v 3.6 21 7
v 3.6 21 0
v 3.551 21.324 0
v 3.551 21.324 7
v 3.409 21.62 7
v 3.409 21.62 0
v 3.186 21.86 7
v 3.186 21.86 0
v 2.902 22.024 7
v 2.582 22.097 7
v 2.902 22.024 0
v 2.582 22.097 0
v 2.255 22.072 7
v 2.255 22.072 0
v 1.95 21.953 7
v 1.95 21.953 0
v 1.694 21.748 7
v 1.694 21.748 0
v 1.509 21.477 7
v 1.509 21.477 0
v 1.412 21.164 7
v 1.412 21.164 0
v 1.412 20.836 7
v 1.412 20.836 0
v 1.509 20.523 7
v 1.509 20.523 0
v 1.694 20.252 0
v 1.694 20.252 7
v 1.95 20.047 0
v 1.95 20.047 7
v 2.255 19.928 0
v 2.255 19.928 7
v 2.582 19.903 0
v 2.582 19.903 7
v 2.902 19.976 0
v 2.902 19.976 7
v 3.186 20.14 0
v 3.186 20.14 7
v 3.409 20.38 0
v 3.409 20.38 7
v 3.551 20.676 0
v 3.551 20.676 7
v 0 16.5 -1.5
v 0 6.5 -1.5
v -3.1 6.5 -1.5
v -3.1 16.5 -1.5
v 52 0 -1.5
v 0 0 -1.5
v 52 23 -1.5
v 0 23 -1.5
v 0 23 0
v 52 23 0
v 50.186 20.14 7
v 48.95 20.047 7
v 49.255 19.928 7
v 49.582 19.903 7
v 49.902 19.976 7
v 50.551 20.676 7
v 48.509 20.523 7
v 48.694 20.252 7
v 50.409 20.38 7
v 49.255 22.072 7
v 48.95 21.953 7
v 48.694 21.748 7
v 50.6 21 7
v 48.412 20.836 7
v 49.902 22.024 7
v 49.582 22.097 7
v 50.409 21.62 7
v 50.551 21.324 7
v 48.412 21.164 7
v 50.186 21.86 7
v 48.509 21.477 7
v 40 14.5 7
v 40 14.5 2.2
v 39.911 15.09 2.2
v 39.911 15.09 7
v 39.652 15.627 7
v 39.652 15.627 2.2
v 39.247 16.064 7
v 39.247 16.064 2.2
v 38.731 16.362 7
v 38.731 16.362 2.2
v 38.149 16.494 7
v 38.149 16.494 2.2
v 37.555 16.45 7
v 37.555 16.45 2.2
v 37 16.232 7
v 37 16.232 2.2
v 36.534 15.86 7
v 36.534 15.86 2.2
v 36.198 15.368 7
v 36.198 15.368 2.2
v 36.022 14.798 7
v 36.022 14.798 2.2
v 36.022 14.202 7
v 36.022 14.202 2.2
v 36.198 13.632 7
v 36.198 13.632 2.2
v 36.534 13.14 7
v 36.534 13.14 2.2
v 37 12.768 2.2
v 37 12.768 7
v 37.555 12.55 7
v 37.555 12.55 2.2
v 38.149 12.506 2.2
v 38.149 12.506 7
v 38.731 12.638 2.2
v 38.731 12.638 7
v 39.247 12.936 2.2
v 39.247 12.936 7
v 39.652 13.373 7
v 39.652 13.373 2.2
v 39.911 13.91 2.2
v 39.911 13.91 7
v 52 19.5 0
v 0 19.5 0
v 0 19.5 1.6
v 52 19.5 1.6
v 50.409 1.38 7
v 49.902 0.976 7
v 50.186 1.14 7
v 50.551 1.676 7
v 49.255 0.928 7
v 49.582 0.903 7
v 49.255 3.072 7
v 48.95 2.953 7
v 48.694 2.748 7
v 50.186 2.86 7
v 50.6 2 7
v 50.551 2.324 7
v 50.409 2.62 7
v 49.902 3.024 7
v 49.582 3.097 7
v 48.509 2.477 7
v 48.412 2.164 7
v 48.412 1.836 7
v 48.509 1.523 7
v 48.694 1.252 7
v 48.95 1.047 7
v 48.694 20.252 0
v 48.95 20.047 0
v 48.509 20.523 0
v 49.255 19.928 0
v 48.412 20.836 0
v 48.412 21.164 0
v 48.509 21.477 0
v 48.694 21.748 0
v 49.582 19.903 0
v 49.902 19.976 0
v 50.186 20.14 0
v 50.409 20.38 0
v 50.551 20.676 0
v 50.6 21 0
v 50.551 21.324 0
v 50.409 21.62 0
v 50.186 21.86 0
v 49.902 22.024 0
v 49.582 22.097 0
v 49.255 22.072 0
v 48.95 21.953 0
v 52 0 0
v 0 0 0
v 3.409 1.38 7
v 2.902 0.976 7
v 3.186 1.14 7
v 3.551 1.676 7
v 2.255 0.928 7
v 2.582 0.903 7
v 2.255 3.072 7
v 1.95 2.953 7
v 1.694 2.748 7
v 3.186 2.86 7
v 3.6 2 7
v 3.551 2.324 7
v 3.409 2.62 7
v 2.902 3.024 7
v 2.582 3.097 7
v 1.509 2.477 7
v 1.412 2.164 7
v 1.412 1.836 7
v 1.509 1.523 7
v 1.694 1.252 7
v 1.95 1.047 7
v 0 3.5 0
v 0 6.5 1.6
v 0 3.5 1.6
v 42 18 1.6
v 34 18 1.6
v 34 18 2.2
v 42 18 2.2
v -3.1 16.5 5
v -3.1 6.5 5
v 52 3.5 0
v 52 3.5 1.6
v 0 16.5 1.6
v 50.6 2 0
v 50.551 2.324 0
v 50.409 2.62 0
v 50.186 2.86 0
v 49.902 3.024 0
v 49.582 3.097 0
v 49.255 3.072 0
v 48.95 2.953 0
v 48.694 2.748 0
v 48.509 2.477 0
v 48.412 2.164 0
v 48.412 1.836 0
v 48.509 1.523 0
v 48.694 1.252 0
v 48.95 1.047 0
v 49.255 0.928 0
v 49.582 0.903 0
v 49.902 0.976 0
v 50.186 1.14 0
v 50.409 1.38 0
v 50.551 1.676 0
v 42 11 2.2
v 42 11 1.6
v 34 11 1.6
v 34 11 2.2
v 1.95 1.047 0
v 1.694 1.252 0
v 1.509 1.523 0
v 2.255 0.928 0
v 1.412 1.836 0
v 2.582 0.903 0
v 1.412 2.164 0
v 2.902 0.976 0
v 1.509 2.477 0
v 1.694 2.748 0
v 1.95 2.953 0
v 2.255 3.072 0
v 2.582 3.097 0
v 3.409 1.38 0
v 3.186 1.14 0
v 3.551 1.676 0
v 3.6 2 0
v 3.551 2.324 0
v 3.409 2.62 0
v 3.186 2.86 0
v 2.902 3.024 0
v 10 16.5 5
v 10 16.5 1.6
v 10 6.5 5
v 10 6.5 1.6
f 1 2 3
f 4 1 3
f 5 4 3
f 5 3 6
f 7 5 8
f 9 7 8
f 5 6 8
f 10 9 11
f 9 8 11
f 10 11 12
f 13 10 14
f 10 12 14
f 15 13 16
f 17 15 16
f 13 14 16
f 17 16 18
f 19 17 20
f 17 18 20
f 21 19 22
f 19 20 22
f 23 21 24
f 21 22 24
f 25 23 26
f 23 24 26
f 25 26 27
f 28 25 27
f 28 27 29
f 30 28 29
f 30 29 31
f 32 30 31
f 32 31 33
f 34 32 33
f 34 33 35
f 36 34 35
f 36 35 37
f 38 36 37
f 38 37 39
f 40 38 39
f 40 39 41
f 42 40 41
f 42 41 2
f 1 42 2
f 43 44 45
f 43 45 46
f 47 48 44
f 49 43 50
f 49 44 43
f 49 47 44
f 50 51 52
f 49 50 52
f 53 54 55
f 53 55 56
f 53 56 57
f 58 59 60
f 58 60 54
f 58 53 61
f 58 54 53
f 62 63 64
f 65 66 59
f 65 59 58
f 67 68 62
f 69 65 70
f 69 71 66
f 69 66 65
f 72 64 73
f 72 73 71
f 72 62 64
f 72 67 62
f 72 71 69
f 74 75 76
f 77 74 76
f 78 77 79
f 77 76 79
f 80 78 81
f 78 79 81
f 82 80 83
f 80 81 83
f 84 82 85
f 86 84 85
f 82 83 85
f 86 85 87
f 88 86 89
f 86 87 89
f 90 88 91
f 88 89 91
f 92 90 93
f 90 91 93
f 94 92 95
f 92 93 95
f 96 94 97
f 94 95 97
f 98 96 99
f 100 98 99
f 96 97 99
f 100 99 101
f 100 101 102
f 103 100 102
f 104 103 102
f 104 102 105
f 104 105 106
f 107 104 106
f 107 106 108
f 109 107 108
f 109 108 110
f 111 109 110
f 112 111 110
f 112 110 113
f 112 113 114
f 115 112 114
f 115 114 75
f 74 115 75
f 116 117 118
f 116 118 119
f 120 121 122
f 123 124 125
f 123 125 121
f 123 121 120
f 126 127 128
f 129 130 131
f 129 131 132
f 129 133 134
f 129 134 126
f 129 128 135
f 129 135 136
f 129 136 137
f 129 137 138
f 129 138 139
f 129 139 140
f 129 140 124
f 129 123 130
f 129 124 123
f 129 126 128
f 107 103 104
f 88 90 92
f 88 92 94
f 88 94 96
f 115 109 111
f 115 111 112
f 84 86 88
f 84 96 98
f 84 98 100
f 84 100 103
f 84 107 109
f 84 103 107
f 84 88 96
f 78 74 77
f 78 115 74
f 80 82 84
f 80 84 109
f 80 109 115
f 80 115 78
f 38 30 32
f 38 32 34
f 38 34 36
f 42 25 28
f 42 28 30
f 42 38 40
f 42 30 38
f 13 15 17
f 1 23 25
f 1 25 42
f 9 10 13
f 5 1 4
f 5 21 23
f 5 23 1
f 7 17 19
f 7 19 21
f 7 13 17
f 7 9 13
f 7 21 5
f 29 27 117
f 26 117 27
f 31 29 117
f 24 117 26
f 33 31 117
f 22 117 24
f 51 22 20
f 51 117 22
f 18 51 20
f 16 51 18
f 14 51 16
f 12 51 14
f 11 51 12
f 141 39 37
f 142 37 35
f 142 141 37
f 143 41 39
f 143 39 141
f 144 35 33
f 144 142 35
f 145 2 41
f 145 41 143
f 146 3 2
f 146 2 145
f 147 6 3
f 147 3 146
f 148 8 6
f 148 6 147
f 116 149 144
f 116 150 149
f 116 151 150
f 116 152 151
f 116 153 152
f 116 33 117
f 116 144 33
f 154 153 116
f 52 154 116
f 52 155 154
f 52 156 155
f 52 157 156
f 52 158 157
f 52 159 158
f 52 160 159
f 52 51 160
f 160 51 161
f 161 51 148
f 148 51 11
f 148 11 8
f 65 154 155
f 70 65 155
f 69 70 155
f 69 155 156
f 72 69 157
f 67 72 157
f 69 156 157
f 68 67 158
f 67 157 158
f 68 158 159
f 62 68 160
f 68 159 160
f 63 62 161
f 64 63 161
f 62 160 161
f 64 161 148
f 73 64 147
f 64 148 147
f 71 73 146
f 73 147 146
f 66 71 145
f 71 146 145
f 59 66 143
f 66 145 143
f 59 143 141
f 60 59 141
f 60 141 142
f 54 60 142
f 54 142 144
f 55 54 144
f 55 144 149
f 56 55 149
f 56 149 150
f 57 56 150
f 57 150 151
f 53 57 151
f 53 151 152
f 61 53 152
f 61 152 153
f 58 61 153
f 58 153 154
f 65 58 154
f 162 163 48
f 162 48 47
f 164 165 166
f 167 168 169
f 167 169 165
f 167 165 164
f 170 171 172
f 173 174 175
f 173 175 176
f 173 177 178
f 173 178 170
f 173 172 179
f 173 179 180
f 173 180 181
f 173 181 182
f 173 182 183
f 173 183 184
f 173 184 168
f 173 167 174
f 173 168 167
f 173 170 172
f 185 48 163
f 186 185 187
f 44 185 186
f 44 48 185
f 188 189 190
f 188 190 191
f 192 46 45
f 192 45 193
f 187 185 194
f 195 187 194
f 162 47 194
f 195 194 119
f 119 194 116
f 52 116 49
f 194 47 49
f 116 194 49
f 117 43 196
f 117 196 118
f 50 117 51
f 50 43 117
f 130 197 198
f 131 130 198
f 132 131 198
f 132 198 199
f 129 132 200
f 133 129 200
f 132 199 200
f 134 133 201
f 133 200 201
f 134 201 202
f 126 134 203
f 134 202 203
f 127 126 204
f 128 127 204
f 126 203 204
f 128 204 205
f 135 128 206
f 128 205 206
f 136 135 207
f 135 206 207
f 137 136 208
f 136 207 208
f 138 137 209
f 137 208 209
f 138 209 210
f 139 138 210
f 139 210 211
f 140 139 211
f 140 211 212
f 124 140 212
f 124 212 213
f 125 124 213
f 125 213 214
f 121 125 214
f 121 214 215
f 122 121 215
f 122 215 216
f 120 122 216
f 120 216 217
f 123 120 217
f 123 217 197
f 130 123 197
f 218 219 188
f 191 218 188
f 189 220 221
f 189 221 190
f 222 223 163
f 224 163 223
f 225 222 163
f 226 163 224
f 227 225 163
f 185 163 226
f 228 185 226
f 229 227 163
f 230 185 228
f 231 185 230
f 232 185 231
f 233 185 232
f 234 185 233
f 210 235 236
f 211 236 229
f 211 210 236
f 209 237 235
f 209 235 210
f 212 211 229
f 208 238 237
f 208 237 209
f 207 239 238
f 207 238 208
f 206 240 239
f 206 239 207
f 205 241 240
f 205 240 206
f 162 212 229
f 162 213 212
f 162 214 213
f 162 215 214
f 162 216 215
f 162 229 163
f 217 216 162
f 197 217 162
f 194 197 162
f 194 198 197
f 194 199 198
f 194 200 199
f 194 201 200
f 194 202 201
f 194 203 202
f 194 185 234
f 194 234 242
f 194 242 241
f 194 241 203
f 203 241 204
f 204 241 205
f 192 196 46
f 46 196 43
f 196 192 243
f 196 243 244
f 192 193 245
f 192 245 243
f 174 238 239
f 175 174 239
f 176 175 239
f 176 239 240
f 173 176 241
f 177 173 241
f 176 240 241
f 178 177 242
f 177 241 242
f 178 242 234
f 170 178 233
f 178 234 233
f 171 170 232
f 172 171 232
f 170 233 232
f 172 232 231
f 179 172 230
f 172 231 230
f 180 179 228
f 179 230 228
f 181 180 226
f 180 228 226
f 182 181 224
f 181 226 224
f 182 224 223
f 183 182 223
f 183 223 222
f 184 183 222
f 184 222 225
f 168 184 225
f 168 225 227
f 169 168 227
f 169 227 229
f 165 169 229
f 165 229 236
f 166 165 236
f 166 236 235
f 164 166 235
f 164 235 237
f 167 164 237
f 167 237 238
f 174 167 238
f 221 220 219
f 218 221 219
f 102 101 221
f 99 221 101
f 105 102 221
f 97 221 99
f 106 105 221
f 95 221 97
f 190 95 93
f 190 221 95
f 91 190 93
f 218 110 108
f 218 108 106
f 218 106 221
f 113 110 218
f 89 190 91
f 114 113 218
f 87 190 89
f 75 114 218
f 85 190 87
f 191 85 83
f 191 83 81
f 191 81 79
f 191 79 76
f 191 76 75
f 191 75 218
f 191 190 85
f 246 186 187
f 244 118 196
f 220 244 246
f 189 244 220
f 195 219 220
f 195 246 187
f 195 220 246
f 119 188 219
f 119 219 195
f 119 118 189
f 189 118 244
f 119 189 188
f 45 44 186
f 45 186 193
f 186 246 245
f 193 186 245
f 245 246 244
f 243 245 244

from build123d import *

# Parameters (mm, degrees)
SKETCH1_W                  = 52
SKETCH1_H                  = 23
SKETCH1_R                  = 1.1
EXT_PCB_DEPTH              = 1.5
SKETCH2_W                  = 11.1
SKETCH2_H                  = 10
EXT_USB_SOCKET_DEPTH       = 5
SKETCH3_W                  = 52
SKETCH3_H                  = 16
EXT_COMPONENTS_DEPTH       = 1.6
SKETCH4_W                  = 8
SKETCH4_H                  = 7
EXT_RESET_BUTTON_DEPTH     = 2.2
SKETCH4_3_R                = 2
EXT_RESET_BUTTON_PEG_DEPTH = 7
SKETCH5_W                  = 4.4
SKETCH5_H                  = 9.4
EXT_USB_PLUG_DEPTH         = 2
SKETCH6_W                  = 1.5
SKETCH6_H                  = 10
EXT_USB_SLOT_DEPTH         = 3.1
EXT_START                  = -1.5
SKETCH7_R                  = 1.1
EXT_MOUNTS_DEPTH           = 8.5


with BuildPart() as part:
    # Sketch1 → ext PCB (new body)
    with BuildSketch(Plane.XY):
        with Locations((26, 11.5)):
            Rectangle(SKETCH1_W, SKETCH1_H)
        with Locations((2.5, 21)):
            Circle(SKETCH1_R, mode=Mode.SUBTRACT)
        with Locations((49.5, 21)):
            Circle(SKETCH1_R, mode=Mode.SUBTRACT)
        with Locations((2.5, 2)):
            Circle(SKETCH1_R, mode=Mode.SUBTRACT)
        with Locations((49.5, 2)):
            Circle(SKETCH1_R, mode=Mode.SUBTRACT)
    extrude(amount=-EXT_PCB_DEPTH)

    # Sketch2 → ext USB socket (add)
    with BuildSketch(Plane.XY):
        with Locations((4.45, 11.5)):
            Rectangle(SKETCH2_W, SKETCH2_H)
    extrude(amount=EXT_USB_SOCKET_DEPTH)

    # Sketch3 → ext Components (add)
    with BuildSketch(Plane.XY):
        with Locations((26, 11.5)):
            Rectangle(SKETCH3_W, SKETCH3_H)
    extrude(amount=EXT_COMPONENTS_DEPTH)

    # Sketch4 → ext Reset button (add)
    with BuildSketch(Plane.XY):
        with Locations((38, 14.5)):
            Rectangle(SKETCH4_W, SKETCH4_H)
    extrude(amount=EXT_RESET_BUTTON_DEPTH)

    # Sketch4<3> → ext Reset Button Peg (add)
    with BuildSketch(Plane.XY):
        with Locations((38, 14.5)):
            Circle(SKETCH4_3_R)
    extrude(amount=EXT_RESET_BUTTON_PEG_DEPTH)

    # Sketch5 → ext USB Plug (add)
    with BuildSketch(Plane.ZY.offset(1.1)):
        with Locations((2.5, 11.5)):
            Rectangle(SKETCH5_W, SKETCH5_H)
    extrude(amount=EXT_USB_PLUG_DEPTH)

    # Sketch6 → ext USB slot (add)
    with BuildSketch(Plane.ZY):
        Polygon((1.6, 6.5), (5, 6.5), (5, 16.5), (1.6, 16.5), (0, 16.5), (0, 6.5), align=None)
        with Locations((-0.75, 11.5)):
            Rectangle(SKETCH6_W, SKETCH6_H)
    extrude(amount=EXT_USB_SLOT_DEPTH)

    # Sketch7 → ext Mounts (add)
    with BuildSketch(Plane.XY.offset(EXT_START)):
        with Locations((49.5, 2)):
            Circle(SKETCH7_R)
        with Locations((2.5, 2)):
            Circle(SKETCH7_R)
        with Locations((2.5, 21)):
            Circle(SKETCH7_R)
        with Locations((49.5, 21)):
            Circle(SKETCH7_R)
    extrude(amount=EXT_MOUNTS_DEPTH)


solid = part.part
